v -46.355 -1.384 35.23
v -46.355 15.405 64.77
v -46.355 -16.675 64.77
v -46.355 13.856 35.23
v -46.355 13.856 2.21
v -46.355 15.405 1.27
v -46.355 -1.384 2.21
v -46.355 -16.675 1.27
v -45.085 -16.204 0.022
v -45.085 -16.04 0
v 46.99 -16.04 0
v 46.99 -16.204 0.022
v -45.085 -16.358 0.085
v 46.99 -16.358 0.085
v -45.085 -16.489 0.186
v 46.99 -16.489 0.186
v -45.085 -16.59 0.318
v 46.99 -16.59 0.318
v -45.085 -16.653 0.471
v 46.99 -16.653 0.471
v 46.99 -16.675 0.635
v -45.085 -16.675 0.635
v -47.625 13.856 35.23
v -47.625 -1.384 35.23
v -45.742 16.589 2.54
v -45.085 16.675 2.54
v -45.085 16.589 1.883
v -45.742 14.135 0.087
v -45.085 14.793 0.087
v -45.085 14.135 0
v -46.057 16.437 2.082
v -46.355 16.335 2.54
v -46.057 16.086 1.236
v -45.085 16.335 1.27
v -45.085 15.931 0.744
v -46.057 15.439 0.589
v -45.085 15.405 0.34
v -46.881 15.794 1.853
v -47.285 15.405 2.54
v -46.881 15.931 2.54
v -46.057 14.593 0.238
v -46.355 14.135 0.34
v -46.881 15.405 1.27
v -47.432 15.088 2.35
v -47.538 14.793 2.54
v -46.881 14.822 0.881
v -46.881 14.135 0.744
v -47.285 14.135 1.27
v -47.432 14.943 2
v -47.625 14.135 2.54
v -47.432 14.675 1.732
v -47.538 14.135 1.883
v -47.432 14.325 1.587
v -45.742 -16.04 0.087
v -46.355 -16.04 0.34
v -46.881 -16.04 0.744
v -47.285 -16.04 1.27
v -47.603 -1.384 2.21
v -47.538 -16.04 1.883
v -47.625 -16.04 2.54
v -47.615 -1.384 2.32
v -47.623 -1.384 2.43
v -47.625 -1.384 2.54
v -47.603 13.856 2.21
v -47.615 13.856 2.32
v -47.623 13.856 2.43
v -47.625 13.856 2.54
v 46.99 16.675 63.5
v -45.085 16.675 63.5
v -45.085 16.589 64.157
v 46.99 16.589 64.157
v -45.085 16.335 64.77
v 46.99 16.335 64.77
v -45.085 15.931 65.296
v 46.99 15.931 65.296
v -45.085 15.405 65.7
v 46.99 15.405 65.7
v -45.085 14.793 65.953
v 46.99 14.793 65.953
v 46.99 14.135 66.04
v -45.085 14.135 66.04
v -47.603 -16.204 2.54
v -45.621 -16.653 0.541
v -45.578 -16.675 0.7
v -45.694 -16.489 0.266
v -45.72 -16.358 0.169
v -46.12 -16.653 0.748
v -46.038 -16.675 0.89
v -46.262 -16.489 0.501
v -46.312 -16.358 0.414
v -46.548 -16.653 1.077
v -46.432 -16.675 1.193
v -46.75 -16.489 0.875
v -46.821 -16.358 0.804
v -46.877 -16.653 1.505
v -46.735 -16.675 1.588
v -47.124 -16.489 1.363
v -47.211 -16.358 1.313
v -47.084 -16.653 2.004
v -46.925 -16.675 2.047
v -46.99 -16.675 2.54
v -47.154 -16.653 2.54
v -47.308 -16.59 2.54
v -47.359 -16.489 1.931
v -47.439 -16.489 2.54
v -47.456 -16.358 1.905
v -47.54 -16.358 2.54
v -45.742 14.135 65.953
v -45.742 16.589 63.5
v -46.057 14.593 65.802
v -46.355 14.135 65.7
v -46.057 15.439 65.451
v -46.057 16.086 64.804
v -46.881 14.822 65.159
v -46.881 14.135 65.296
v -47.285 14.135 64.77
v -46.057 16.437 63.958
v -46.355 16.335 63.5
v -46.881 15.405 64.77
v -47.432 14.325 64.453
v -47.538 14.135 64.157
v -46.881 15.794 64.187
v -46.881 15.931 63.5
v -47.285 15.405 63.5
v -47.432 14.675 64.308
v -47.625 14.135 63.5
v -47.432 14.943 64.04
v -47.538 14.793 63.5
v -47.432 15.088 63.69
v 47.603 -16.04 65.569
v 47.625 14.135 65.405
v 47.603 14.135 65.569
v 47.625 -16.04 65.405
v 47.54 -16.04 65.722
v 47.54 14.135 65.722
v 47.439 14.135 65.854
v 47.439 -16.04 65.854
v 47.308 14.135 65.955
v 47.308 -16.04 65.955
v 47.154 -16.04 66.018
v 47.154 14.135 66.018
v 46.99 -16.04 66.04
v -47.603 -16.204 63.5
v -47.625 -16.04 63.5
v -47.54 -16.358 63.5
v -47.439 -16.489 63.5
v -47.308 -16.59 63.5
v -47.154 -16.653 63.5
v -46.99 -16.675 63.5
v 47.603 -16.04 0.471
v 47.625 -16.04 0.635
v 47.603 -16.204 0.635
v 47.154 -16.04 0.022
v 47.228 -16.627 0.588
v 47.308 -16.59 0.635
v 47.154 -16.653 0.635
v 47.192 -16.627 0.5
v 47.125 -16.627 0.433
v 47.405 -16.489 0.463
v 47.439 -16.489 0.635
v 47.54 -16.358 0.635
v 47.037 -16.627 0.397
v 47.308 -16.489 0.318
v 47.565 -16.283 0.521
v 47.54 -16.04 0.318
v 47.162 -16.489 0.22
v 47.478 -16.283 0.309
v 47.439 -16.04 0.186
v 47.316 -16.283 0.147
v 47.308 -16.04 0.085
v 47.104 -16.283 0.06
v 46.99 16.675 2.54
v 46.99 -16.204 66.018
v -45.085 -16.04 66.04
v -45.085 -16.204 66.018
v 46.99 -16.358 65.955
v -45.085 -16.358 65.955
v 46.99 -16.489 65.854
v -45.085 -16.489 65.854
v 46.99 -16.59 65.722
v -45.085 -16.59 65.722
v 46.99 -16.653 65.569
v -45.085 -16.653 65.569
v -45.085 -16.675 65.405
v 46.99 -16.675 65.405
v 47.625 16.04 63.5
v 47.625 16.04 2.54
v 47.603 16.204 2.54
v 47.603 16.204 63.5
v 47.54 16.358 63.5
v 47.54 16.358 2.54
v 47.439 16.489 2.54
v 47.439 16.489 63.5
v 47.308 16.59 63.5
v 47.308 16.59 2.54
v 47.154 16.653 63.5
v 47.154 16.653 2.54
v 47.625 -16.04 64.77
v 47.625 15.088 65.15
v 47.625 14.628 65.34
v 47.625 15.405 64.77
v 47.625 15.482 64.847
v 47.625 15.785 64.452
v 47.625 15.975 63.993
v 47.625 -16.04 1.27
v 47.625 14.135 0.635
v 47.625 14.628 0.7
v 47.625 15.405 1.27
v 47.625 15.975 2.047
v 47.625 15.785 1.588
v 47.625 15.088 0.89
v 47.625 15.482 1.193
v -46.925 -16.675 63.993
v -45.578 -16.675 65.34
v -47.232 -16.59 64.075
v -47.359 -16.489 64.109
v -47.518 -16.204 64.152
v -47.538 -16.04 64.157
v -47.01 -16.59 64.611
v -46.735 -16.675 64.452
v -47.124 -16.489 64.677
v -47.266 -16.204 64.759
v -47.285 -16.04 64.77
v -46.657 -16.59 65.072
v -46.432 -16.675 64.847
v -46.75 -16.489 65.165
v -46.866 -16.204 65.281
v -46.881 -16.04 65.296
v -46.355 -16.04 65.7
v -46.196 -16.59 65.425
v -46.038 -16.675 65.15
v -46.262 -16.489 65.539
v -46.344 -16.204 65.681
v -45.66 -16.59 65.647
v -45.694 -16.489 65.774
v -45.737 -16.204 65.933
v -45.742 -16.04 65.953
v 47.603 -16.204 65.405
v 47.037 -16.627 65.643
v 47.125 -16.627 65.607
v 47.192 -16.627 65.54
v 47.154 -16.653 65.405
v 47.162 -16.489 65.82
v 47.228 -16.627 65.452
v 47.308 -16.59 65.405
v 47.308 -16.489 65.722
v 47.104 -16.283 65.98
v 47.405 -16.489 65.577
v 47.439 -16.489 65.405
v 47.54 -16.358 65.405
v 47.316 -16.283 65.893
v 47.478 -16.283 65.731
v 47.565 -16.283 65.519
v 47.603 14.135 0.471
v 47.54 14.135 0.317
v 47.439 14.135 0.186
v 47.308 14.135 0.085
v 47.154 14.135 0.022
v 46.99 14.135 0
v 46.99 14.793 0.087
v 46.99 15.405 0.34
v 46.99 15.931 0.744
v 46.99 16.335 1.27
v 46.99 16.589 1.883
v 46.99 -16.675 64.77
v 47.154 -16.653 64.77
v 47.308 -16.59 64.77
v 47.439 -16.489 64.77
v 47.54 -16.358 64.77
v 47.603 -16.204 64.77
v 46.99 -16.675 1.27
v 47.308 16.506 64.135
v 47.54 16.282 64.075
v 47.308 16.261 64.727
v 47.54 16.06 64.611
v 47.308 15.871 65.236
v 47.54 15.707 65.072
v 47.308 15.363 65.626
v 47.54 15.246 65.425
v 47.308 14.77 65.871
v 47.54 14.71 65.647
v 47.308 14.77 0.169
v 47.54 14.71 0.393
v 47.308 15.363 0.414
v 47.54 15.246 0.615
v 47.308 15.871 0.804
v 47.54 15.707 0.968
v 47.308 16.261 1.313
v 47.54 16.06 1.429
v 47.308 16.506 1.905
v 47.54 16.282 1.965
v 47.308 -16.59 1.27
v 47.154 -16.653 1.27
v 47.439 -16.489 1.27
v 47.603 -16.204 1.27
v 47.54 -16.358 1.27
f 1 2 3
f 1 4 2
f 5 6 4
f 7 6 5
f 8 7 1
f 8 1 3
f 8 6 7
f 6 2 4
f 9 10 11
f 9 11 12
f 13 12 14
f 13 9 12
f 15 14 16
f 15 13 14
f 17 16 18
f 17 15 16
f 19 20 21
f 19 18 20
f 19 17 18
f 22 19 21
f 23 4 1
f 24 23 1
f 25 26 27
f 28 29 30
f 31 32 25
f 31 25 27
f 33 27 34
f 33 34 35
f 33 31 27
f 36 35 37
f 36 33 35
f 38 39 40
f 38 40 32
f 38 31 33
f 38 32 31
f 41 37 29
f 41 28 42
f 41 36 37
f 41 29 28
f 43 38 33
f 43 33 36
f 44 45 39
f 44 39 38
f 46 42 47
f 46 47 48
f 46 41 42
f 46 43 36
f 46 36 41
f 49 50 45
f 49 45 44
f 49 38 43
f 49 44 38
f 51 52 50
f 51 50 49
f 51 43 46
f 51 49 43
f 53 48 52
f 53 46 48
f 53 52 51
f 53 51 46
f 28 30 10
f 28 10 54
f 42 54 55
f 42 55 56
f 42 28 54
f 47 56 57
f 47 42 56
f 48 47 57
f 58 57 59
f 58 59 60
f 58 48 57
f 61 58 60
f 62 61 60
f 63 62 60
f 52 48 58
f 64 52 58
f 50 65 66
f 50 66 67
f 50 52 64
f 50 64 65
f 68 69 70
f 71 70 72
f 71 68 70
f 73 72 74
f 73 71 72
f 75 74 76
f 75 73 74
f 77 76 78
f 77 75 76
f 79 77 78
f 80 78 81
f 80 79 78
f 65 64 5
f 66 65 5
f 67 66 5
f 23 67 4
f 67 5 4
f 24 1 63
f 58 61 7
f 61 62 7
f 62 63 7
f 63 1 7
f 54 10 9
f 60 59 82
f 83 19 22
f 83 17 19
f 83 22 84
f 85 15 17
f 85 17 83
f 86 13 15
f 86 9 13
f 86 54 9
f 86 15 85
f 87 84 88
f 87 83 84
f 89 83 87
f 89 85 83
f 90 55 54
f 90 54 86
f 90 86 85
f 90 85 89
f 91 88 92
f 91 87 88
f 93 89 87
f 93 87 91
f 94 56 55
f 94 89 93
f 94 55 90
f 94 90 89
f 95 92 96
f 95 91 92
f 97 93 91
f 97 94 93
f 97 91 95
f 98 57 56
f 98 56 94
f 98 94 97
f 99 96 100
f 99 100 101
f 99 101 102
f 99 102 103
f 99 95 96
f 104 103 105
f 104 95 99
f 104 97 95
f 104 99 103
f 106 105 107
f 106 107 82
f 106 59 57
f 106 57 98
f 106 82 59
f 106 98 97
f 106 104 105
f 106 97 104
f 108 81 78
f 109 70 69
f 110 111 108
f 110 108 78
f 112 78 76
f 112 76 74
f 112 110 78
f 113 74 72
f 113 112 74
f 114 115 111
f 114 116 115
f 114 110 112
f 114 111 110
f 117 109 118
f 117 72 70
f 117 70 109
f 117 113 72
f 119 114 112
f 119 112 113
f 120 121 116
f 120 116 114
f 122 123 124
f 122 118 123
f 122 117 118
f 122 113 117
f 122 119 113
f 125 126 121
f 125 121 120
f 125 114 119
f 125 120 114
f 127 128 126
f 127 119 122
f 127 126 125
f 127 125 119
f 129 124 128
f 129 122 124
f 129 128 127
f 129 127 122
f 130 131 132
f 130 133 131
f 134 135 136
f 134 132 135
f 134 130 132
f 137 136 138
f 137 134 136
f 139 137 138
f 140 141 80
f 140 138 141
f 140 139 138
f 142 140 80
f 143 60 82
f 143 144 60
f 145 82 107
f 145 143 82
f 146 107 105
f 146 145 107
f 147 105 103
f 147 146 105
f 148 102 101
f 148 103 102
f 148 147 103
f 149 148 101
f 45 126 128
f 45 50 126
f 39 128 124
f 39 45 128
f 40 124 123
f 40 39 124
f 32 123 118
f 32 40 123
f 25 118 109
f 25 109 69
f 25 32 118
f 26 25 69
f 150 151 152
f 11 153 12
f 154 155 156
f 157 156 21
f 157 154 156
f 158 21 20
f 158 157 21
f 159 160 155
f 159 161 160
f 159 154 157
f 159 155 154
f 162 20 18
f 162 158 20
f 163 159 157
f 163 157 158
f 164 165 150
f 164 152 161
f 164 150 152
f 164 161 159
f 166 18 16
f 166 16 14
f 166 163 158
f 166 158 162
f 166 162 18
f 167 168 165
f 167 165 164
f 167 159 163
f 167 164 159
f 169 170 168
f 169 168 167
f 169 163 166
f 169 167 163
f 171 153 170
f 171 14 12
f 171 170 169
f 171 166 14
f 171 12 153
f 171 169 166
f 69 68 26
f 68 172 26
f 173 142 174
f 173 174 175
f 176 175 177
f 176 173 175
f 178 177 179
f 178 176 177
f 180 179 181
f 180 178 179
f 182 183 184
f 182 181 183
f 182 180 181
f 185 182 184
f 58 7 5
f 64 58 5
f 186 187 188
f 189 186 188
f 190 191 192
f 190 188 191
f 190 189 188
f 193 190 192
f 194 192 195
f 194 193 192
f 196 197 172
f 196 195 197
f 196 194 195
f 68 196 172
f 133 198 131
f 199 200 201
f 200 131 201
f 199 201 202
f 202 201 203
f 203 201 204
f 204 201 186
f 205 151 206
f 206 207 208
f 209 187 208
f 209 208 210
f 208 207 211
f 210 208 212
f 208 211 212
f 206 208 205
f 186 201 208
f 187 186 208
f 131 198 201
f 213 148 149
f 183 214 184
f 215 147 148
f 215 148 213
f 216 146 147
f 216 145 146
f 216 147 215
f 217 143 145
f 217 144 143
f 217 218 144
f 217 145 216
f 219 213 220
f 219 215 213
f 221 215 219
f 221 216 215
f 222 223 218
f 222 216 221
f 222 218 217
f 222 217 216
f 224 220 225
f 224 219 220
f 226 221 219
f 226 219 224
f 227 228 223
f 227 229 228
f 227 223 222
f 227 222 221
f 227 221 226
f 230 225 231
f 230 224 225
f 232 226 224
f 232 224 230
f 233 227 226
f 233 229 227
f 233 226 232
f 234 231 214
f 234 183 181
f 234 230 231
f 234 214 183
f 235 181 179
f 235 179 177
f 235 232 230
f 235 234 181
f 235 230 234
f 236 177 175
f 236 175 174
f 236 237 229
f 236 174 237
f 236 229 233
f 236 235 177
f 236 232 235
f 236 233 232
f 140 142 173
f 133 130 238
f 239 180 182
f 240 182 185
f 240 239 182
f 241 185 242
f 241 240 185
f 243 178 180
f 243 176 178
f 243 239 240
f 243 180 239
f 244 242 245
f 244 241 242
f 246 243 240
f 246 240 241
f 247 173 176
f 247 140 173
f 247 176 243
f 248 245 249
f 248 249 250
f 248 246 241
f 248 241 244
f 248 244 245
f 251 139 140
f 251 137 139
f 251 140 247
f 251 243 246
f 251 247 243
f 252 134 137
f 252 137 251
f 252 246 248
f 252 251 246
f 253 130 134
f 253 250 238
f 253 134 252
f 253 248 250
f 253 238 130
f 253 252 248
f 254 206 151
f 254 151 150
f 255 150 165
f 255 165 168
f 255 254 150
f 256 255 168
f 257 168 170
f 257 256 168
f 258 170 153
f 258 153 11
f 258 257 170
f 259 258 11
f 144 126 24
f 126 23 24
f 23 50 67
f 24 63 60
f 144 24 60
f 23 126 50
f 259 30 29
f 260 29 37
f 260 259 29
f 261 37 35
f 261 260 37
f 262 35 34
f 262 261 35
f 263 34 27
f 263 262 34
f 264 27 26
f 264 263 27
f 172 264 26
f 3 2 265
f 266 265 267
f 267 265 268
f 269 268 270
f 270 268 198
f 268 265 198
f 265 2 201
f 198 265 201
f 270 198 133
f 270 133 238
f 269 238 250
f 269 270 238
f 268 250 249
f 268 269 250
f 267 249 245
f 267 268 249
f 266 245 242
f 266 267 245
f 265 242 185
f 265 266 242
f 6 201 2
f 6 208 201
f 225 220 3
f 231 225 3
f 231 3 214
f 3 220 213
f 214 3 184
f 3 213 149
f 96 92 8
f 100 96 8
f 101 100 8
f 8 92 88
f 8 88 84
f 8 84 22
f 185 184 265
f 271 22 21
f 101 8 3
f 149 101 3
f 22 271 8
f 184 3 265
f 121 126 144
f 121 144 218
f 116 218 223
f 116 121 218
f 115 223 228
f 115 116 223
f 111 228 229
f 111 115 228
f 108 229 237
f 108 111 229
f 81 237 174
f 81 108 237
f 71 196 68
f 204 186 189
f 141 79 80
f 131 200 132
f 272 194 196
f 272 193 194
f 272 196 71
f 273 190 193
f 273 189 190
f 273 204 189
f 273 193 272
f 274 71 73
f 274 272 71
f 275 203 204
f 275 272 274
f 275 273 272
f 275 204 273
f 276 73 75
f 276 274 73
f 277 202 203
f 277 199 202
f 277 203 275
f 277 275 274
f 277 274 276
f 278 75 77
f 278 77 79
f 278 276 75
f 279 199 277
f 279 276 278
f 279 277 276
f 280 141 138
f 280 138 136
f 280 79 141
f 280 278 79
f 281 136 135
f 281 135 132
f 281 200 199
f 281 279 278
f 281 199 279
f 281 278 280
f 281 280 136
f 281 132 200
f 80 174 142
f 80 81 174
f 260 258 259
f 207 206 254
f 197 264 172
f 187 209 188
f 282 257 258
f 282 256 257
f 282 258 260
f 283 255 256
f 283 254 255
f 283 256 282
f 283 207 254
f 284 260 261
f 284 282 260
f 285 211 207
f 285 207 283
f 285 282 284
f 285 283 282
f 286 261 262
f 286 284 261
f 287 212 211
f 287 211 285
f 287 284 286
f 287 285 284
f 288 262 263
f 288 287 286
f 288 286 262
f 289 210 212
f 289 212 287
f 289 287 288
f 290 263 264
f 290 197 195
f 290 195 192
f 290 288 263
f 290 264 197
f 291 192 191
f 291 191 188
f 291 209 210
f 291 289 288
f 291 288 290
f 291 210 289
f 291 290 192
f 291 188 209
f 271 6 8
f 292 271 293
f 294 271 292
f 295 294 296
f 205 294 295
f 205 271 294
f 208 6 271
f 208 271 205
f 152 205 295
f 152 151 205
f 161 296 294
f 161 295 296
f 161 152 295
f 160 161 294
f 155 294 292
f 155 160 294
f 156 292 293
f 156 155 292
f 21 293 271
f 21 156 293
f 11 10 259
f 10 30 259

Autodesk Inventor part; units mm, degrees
ref_plane "YZ Plane" through (0, 0, 0) normal (1, 0, 0) x (0, 1, 0)
ref_plane "XZ Plane" through (0, 0, 0) normal (0, 1, 0) x (-1, 0, 0)
ref_plane "XY Plane" through (0, 0, 0) normal (0, 0, 1) x (1, 0, 0)
sketch "Sketch1" plane through (0, 0, 0) normal (0, 0, 1) x (1, 0, 0)
  line L0 (-47.625, -16.6751) -> (47.625, -16.6751)
  line L1 (47.625, -16.6751) -> (47.625, 16.6751)
  line L2 (47.625, 16.6751) -> (-47.625, 16.6751)
  line L3 (-47.625, 16.6751) -> (-47.625, -16.6751)
  line L4 (-47.625, -16.6751) -> (47.625, 16.6751) construction
  line L5 (47.625, -16.6751) -> (-47.625, 16.6751) construction
  point P0 (0, 0)
  dimension "d0" = 95.25
  dimension "d1" = 33.3502
extrude "Extrusion1" add sketch "Sketch1" along normal blind 66.04
shell "Shell1" thickness 1.27 removed faces 2 at (47.625, -5.5584, 44.0267) at (-15.875, -16.6751, 44.0267)
sketch "Sketch2" plane through (-46.355, -16.6751, 1.27) normal (1, 0, 0) x (0, 0, -1)
  line L0 (0, 32.0802) -> (0, 0) projected
  line L1 (0, 0) -> (-63.5, 0) projected
  line L2 (-33.9598, 15.2908) -> (-0.9398, 15.2908)
  line L3 (-0.9398, 15.2908) -> (-0.9398, 30.5308)
  line L4 (-0.9398, 30.5308) -> (-33.9598, 30.5308)
  line L5 (-33.9598, 30.5308) -> (-33.9598, 15.2908)
  line L6 (-33.9598, 15.2908) -> (-0.9398, 30.5308) construction
  line L7 (-0.9398, 15.2908) -> (-33.9598, 30.5308) construction
  point P0 (1.27, 16.6751)
  point P1 (-17.4498, 22.9108)
  dimension "d5" = 17.4498
  dimension "d6" = 22.9108
  dimension "d13" = 33.02
  dimension "d14" = 15.24
extrude "Extrusion2" cut sketch "Sketch2" against normal up to surface (1.27 mm away)
fillet "Fillet1" radius 2.54 5 edges at (0, 16.6751, 66.04) (-47.625, 16.6751, 33.02) (0, 16.6751, 0) (-47.625, 0, 0) (-47.625, 0, 66.04)
fillet "Fillet2" radius 0.635 5 edges at (47.625, -1.27, 0) (47.625, 15.9312, 0.7439) (47.625, 16.6751, 33.02) (47.625, 15.9312, 65.2961) (47.625, -1.27, 66.04)
fillet "Fillet3" radius 0.635 9 edges at (47.439, -16.6751, 65.854) (47.625, -16.6751, 65.0875) (-46.8811, -16.6751, 65.2961) (-47.625, -16.6751, 33.02) (-46.8811, -16.6751, 0.7439) (0.9525, -16.6751, 0) (47.439, -16.6751, 0.186) (47.625, -16.6751, 0.9525) (0.9525, -16.6751, 66.04)
properties part number "SPO2_cover"
